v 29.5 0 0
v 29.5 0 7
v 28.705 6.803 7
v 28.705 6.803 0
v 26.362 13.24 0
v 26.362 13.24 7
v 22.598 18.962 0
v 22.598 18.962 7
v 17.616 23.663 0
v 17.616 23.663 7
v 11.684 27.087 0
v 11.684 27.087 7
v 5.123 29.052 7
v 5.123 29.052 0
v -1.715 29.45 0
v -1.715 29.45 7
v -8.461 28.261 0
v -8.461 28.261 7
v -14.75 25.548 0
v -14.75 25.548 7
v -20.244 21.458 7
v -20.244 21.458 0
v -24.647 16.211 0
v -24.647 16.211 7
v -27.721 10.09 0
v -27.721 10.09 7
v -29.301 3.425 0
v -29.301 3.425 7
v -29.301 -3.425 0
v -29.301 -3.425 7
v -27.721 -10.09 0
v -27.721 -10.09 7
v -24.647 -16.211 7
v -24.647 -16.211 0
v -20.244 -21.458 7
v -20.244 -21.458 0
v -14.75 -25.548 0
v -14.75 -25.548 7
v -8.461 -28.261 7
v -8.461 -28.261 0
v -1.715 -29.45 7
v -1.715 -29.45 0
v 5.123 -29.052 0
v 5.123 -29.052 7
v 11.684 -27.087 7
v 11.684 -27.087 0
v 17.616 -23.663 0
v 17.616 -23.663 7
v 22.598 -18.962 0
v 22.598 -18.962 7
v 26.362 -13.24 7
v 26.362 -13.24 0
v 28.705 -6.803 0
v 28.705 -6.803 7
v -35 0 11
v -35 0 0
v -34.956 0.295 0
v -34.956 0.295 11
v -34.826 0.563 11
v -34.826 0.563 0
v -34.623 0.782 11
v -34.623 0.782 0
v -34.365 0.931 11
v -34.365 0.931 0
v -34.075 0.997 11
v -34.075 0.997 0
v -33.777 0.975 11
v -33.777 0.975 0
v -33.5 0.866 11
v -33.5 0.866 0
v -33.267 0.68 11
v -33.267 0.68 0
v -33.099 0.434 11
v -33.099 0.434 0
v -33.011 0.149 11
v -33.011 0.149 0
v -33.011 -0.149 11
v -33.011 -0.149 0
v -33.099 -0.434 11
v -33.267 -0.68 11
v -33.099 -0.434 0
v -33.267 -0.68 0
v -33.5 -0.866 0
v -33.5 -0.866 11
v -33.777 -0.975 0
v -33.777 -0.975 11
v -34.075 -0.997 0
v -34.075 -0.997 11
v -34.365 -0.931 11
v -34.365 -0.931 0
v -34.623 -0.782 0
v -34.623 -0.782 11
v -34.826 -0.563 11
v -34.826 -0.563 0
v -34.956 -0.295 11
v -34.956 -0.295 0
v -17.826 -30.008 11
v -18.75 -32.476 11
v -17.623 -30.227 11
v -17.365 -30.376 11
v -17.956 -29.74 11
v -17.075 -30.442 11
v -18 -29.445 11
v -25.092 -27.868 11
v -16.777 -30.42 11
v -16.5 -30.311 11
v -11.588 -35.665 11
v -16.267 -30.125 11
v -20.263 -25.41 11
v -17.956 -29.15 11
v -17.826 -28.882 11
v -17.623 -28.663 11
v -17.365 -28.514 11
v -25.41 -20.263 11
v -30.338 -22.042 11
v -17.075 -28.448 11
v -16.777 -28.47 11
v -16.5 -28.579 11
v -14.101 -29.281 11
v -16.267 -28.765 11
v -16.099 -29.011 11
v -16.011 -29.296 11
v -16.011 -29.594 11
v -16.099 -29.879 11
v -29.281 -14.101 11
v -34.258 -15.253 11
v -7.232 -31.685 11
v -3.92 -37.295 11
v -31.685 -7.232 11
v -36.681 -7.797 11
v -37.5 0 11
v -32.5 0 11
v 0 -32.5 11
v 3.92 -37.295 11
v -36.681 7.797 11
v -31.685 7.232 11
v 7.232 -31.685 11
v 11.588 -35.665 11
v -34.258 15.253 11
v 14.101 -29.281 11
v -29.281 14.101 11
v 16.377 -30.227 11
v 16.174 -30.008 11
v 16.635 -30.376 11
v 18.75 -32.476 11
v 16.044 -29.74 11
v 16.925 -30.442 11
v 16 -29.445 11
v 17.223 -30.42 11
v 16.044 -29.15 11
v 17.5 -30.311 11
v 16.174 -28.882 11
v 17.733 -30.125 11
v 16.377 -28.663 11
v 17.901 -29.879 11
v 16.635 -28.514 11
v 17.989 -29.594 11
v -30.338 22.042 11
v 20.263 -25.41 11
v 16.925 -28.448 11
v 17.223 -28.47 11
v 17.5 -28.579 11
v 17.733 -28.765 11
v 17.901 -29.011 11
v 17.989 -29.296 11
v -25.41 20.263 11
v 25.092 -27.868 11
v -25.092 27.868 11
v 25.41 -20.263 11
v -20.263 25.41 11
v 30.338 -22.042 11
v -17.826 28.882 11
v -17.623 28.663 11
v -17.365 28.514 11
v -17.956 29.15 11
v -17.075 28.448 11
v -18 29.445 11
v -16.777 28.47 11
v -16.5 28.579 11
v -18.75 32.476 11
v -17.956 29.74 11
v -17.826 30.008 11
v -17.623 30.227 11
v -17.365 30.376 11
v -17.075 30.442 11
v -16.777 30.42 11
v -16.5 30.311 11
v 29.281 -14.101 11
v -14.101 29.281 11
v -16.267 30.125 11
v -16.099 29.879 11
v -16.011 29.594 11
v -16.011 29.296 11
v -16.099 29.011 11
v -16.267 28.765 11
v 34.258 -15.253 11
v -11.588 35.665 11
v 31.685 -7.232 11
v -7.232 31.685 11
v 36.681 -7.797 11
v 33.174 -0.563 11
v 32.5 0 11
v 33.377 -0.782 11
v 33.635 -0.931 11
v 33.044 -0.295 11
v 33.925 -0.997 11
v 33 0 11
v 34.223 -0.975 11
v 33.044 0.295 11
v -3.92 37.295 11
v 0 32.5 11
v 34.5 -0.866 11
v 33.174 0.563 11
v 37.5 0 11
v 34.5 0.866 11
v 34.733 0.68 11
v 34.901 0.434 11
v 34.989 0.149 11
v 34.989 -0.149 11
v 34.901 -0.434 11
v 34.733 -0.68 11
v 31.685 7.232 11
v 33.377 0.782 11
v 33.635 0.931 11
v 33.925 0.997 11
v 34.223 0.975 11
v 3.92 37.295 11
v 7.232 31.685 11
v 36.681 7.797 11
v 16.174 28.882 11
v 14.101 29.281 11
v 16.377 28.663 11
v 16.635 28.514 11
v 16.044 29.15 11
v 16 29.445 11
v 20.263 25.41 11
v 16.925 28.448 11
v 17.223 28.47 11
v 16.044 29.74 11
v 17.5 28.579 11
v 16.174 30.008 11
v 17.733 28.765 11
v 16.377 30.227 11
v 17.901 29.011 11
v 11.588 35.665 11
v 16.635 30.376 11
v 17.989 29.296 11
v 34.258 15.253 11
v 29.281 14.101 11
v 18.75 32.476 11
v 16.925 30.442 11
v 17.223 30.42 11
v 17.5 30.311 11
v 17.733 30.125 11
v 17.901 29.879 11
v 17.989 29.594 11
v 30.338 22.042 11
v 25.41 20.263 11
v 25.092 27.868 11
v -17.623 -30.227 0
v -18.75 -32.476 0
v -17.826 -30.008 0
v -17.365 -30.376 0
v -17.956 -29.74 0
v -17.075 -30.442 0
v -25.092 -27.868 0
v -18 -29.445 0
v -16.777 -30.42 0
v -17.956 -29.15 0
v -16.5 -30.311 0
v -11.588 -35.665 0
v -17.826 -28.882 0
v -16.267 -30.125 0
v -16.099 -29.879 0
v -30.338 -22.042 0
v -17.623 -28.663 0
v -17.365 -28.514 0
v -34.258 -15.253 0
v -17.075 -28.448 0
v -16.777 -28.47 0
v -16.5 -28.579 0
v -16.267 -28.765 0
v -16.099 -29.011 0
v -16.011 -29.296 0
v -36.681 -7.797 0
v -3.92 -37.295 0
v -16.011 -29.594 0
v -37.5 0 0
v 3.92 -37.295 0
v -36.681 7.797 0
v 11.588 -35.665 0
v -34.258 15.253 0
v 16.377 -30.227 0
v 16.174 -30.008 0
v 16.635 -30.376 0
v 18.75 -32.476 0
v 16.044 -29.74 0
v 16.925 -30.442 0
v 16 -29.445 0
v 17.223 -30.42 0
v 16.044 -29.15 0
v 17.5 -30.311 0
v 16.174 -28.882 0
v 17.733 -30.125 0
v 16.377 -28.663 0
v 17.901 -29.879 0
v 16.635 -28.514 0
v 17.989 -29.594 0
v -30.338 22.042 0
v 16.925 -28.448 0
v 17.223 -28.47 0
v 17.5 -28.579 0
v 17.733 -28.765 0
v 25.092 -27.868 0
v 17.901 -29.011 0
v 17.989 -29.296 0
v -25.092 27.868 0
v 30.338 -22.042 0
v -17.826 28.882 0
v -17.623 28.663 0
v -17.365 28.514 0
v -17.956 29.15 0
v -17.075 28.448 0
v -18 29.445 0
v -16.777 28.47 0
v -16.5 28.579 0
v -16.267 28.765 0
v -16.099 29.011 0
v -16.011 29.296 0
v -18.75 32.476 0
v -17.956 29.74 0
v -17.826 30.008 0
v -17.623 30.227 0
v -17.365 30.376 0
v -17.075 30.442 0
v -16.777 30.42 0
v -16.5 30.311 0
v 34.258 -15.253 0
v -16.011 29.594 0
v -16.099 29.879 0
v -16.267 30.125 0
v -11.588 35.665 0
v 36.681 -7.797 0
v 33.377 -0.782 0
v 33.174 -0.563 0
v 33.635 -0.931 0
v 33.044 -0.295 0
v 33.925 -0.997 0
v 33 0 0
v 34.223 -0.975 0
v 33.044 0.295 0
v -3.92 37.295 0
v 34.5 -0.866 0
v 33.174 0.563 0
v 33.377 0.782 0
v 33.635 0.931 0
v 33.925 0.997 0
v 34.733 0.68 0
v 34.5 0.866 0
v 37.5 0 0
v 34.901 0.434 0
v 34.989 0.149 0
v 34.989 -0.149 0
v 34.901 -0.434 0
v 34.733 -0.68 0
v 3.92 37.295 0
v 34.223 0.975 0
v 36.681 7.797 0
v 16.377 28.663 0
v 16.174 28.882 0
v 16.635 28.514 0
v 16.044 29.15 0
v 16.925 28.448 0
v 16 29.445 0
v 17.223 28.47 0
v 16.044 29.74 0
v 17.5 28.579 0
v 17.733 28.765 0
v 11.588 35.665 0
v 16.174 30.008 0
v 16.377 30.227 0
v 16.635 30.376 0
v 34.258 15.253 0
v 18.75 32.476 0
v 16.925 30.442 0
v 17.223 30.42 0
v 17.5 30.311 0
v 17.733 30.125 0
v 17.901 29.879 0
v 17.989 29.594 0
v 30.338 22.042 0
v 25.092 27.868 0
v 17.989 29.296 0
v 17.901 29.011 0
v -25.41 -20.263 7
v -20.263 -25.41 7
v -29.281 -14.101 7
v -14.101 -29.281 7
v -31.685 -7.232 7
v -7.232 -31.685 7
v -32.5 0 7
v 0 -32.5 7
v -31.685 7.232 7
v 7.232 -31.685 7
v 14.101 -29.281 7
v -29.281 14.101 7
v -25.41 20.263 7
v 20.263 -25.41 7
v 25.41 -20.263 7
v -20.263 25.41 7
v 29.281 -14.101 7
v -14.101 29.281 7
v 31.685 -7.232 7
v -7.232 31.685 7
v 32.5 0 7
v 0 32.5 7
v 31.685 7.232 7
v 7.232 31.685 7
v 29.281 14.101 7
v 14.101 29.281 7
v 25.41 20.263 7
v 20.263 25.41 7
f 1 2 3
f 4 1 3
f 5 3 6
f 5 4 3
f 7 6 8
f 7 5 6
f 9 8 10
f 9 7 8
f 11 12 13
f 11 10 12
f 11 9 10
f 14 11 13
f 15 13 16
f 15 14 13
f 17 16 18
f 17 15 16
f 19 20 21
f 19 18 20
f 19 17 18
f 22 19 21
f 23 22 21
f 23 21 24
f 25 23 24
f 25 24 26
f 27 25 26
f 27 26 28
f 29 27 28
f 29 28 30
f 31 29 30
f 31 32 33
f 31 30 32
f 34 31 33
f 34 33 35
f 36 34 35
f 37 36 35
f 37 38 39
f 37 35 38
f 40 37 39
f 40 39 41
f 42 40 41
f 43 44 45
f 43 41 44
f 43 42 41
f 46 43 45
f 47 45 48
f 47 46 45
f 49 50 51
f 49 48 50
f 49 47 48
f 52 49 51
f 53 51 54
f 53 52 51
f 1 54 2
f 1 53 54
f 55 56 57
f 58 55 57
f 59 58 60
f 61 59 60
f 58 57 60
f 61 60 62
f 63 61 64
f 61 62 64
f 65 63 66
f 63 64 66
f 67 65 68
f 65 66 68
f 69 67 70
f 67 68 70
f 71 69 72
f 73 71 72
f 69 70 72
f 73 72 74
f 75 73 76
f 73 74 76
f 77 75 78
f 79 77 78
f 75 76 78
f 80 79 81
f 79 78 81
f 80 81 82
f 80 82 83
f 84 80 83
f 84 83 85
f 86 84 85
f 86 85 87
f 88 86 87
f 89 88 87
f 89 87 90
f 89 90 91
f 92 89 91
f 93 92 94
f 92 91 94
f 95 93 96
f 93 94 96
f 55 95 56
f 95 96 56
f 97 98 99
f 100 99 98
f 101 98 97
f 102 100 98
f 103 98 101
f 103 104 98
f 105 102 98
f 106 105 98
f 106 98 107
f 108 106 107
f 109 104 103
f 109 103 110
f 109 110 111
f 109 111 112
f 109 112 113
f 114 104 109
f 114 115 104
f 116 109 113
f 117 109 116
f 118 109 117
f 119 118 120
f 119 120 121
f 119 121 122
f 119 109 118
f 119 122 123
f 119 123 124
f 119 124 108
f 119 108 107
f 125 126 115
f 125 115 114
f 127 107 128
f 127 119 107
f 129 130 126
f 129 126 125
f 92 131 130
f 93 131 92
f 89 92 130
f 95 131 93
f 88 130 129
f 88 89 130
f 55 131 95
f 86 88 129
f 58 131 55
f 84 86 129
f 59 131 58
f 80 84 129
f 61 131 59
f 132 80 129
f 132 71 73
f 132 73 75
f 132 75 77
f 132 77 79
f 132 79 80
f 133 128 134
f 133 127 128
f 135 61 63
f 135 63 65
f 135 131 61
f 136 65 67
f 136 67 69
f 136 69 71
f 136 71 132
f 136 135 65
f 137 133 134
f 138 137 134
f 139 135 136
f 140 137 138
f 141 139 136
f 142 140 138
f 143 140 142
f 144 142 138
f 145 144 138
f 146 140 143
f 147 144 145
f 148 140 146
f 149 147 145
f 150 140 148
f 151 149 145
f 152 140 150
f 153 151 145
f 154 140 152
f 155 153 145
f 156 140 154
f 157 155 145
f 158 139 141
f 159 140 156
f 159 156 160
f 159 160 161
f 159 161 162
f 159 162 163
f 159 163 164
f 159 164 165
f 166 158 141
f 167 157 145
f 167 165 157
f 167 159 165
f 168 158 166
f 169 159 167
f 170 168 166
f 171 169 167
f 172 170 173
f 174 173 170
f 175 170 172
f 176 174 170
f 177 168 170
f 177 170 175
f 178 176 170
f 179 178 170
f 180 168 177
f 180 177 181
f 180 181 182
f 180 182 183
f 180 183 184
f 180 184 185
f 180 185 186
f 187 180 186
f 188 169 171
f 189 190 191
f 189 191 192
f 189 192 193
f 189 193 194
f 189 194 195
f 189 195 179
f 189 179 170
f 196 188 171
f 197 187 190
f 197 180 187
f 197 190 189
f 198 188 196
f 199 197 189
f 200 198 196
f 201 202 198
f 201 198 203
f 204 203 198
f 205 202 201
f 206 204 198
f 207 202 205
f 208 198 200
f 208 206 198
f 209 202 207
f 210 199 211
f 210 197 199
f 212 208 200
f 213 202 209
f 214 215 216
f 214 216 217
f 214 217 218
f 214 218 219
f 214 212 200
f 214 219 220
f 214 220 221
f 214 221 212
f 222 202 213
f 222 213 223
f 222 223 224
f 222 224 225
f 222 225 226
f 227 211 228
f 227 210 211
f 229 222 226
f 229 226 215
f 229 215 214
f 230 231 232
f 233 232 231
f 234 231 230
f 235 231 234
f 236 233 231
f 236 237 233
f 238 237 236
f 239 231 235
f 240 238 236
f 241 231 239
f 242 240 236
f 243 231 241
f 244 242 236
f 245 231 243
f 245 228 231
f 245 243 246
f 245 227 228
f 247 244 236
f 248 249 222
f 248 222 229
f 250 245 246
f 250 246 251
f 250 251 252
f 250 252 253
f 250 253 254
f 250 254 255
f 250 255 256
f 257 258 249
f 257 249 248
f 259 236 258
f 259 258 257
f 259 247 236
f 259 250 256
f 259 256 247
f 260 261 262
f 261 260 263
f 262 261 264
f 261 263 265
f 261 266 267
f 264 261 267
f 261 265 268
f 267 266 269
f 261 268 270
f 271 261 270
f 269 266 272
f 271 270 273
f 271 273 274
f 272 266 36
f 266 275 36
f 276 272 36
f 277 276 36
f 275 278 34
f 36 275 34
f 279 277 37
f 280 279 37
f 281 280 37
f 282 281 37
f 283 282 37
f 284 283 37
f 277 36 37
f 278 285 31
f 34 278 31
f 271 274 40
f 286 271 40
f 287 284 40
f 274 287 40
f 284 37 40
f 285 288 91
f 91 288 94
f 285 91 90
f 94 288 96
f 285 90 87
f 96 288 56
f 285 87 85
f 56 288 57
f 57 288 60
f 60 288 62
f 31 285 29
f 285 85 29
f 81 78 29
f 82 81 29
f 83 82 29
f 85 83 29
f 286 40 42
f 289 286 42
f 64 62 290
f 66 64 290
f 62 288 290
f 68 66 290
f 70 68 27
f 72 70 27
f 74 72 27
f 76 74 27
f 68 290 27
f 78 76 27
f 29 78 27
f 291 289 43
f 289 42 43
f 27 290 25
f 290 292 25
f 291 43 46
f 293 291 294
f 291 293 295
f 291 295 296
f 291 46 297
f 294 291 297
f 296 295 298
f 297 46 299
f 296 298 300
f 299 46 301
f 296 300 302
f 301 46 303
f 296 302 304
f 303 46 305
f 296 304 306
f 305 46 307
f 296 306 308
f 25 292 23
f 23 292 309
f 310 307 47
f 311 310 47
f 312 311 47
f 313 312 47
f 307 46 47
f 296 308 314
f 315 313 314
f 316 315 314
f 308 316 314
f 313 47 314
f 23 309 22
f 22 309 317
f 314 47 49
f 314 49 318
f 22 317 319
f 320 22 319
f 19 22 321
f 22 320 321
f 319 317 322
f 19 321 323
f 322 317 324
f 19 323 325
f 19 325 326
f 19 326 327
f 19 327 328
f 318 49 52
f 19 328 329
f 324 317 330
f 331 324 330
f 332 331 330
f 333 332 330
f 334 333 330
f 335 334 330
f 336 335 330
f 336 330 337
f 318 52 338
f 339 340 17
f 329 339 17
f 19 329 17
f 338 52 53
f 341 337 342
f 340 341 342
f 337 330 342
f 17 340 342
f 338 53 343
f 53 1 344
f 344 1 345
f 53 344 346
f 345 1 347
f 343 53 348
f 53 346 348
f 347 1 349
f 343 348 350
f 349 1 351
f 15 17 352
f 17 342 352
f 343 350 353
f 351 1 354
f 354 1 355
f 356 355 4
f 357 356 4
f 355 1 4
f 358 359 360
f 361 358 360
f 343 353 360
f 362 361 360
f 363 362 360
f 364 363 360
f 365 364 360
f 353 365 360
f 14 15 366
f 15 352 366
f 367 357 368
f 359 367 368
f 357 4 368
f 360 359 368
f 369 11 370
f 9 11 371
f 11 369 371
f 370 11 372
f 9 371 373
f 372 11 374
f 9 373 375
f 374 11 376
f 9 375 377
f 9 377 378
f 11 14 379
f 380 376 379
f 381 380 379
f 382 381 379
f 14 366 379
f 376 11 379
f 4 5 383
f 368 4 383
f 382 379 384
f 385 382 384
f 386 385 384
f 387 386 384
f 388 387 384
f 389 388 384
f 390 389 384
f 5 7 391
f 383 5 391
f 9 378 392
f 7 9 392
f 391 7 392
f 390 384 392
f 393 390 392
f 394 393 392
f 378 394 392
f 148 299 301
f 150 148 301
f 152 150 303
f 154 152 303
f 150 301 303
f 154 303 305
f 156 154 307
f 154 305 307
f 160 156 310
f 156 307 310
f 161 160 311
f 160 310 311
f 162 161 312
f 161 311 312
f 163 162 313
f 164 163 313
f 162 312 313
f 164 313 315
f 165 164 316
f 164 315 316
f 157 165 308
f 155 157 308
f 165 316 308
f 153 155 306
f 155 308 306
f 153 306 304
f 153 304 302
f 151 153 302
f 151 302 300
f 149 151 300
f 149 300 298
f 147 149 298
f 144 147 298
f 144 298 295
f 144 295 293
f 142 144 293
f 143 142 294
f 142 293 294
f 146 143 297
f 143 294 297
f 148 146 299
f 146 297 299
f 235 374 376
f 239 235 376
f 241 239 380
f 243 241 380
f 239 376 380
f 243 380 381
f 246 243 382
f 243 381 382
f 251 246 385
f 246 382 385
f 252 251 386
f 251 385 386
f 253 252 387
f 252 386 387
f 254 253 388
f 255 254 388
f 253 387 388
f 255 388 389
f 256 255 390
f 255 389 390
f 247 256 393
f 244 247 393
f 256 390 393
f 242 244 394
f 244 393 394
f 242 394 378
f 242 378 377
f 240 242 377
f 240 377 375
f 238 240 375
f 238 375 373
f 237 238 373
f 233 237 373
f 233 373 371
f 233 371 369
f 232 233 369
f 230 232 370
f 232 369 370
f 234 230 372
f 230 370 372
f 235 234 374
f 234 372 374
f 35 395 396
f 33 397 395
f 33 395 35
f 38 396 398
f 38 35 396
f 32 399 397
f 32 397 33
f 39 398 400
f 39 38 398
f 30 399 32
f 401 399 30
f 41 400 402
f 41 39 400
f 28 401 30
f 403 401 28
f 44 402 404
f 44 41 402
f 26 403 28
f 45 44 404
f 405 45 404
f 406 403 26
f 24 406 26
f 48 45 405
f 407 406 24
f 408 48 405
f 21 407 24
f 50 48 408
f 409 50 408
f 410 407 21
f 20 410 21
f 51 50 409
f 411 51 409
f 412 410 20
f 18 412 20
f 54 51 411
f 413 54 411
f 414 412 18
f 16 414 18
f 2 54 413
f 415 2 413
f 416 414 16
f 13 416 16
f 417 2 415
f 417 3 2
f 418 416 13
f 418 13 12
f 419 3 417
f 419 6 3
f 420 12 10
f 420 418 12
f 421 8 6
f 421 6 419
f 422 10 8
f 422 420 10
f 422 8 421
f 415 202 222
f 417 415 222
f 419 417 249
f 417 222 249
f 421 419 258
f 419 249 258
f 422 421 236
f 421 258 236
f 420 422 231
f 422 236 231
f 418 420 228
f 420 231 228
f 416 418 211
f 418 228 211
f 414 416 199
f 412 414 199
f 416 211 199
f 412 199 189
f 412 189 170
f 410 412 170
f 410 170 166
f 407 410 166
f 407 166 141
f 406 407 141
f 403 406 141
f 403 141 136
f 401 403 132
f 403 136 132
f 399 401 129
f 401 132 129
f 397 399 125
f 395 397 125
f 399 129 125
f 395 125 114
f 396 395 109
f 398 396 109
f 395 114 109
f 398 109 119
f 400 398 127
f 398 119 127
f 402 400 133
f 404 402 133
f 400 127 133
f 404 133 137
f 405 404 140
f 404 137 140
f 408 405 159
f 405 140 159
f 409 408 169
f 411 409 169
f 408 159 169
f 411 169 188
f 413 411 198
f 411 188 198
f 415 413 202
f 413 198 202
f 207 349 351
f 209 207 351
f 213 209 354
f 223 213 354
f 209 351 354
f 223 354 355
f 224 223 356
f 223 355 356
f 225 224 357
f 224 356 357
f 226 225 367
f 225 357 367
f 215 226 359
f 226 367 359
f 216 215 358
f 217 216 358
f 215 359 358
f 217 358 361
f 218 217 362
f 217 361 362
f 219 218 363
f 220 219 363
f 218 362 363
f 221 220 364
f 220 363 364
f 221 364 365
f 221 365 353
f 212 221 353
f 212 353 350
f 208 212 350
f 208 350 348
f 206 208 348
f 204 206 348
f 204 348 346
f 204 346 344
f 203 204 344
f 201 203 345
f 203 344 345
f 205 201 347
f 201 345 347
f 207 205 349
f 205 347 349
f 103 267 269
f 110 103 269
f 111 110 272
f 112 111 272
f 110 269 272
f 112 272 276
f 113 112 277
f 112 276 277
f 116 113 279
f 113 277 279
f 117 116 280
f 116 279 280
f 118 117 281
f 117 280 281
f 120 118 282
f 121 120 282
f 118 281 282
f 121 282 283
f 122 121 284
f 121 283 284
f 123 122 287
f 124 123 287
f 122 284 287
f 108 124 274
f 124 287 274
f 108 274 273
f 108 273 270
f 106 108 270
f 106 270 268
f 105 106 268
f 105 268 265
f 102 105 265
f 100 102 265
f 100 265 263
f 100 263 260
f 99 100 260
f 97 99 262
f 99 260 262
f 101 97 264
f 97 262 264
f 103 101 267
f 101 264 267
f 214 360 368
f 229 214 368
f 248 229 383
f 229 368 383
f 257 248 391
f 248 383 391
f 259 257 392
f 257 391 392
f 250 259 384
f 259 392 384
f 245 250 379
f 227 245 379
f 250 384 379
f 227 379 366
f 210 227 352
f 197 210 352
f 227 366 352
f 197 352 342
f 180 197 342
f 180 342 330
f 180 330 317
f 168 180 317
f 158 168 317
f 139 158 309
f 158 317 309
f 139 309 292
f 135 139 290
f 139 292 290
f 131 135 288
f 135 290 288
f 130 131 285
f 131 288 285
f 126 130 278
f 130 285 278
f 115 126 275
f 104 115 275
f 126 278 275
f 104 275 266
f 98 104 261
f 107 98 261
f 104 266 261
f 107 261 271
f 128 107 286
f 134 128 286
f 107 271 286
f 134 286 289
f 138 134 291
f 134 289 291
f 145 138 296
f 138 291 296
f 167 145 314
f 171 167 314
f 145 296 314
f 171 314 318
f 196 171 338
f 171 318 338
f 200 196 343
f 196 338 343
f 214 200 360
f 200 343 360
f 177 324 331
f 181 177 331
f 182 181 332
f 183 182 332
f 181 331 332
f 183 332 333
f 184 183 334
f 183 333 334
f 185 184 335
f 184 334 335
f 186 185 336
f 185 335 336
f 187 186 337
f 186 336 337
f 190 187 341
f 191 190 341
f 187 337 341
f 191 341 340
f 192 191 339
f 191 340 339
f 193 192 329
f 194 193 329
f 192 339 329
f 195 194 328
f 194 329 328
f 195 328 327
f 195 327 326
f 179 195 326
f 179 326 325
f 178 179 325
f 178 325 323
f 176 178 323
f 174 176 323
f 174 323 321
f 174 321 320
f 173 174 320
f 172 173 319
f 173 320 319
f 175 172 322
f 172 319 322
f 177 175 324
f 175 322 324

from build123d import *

# Parameters (mm, degrees)
SKETCH1_R           = 37.5
SKETCH1_R_2         = 29.5
BOSS_EXTRUDE1_DEPTH = 11
SKETCH2_R           = 1
CUT_EXTRUDE1_DEPTH  = 11
SKETCH3_R           = 32.5
CUT_EXTRUDE2_DEPTH  = 4


with BuildPart() as part:
    # Sketch1 → Boss-Extrude1 (new body)
    with BuildSketch(Plane.XY):
        Circle(SKETCH1_R)
        Circle(SKETCH1_R_2, mode=Mode.SUBTRACT)
    extrude(amount=BOSS_EXTRUDE1_DEPTH)

    # Sketch2 → Cut-Extrude1 (cut)
    with BuildSketch(Plane(origin=(0, 0, 0), x_dir=(-1, 0, 0), z_dir=(0, 0, -1))):
        with Locations((-17, 29.444863729)):
            Circle(SKETCH2_R)
        with Locations((17, 29.444863729)):
            Circle(SKETCH2_R)
        with Locations((34, 0)):
            Circle(SKETCH2_R)
        with Locations((17, -29.444863729)):
            Circle(SKETCH2_R)
        with Locations((-17, -29.444863729)):
            Circle(SKETCH2_R)
        with Locations((-34, 0)):
            Circle(SKETCH2_R)
    extrude(amount=-CUT_EXTRUDE1_DEPTH, mode=Mode.SUBTRACT)

    # Sketch3 → Cut-Extrude2 (cut)
    with BuildSketch(Plane.XY.offset(11)):
        Circle(SKETCH3_R)
    extrude(amount=-CUT_EXTRUDE2_DEPTH, mode=Mode.SUBTRACT)


solid = part.part
